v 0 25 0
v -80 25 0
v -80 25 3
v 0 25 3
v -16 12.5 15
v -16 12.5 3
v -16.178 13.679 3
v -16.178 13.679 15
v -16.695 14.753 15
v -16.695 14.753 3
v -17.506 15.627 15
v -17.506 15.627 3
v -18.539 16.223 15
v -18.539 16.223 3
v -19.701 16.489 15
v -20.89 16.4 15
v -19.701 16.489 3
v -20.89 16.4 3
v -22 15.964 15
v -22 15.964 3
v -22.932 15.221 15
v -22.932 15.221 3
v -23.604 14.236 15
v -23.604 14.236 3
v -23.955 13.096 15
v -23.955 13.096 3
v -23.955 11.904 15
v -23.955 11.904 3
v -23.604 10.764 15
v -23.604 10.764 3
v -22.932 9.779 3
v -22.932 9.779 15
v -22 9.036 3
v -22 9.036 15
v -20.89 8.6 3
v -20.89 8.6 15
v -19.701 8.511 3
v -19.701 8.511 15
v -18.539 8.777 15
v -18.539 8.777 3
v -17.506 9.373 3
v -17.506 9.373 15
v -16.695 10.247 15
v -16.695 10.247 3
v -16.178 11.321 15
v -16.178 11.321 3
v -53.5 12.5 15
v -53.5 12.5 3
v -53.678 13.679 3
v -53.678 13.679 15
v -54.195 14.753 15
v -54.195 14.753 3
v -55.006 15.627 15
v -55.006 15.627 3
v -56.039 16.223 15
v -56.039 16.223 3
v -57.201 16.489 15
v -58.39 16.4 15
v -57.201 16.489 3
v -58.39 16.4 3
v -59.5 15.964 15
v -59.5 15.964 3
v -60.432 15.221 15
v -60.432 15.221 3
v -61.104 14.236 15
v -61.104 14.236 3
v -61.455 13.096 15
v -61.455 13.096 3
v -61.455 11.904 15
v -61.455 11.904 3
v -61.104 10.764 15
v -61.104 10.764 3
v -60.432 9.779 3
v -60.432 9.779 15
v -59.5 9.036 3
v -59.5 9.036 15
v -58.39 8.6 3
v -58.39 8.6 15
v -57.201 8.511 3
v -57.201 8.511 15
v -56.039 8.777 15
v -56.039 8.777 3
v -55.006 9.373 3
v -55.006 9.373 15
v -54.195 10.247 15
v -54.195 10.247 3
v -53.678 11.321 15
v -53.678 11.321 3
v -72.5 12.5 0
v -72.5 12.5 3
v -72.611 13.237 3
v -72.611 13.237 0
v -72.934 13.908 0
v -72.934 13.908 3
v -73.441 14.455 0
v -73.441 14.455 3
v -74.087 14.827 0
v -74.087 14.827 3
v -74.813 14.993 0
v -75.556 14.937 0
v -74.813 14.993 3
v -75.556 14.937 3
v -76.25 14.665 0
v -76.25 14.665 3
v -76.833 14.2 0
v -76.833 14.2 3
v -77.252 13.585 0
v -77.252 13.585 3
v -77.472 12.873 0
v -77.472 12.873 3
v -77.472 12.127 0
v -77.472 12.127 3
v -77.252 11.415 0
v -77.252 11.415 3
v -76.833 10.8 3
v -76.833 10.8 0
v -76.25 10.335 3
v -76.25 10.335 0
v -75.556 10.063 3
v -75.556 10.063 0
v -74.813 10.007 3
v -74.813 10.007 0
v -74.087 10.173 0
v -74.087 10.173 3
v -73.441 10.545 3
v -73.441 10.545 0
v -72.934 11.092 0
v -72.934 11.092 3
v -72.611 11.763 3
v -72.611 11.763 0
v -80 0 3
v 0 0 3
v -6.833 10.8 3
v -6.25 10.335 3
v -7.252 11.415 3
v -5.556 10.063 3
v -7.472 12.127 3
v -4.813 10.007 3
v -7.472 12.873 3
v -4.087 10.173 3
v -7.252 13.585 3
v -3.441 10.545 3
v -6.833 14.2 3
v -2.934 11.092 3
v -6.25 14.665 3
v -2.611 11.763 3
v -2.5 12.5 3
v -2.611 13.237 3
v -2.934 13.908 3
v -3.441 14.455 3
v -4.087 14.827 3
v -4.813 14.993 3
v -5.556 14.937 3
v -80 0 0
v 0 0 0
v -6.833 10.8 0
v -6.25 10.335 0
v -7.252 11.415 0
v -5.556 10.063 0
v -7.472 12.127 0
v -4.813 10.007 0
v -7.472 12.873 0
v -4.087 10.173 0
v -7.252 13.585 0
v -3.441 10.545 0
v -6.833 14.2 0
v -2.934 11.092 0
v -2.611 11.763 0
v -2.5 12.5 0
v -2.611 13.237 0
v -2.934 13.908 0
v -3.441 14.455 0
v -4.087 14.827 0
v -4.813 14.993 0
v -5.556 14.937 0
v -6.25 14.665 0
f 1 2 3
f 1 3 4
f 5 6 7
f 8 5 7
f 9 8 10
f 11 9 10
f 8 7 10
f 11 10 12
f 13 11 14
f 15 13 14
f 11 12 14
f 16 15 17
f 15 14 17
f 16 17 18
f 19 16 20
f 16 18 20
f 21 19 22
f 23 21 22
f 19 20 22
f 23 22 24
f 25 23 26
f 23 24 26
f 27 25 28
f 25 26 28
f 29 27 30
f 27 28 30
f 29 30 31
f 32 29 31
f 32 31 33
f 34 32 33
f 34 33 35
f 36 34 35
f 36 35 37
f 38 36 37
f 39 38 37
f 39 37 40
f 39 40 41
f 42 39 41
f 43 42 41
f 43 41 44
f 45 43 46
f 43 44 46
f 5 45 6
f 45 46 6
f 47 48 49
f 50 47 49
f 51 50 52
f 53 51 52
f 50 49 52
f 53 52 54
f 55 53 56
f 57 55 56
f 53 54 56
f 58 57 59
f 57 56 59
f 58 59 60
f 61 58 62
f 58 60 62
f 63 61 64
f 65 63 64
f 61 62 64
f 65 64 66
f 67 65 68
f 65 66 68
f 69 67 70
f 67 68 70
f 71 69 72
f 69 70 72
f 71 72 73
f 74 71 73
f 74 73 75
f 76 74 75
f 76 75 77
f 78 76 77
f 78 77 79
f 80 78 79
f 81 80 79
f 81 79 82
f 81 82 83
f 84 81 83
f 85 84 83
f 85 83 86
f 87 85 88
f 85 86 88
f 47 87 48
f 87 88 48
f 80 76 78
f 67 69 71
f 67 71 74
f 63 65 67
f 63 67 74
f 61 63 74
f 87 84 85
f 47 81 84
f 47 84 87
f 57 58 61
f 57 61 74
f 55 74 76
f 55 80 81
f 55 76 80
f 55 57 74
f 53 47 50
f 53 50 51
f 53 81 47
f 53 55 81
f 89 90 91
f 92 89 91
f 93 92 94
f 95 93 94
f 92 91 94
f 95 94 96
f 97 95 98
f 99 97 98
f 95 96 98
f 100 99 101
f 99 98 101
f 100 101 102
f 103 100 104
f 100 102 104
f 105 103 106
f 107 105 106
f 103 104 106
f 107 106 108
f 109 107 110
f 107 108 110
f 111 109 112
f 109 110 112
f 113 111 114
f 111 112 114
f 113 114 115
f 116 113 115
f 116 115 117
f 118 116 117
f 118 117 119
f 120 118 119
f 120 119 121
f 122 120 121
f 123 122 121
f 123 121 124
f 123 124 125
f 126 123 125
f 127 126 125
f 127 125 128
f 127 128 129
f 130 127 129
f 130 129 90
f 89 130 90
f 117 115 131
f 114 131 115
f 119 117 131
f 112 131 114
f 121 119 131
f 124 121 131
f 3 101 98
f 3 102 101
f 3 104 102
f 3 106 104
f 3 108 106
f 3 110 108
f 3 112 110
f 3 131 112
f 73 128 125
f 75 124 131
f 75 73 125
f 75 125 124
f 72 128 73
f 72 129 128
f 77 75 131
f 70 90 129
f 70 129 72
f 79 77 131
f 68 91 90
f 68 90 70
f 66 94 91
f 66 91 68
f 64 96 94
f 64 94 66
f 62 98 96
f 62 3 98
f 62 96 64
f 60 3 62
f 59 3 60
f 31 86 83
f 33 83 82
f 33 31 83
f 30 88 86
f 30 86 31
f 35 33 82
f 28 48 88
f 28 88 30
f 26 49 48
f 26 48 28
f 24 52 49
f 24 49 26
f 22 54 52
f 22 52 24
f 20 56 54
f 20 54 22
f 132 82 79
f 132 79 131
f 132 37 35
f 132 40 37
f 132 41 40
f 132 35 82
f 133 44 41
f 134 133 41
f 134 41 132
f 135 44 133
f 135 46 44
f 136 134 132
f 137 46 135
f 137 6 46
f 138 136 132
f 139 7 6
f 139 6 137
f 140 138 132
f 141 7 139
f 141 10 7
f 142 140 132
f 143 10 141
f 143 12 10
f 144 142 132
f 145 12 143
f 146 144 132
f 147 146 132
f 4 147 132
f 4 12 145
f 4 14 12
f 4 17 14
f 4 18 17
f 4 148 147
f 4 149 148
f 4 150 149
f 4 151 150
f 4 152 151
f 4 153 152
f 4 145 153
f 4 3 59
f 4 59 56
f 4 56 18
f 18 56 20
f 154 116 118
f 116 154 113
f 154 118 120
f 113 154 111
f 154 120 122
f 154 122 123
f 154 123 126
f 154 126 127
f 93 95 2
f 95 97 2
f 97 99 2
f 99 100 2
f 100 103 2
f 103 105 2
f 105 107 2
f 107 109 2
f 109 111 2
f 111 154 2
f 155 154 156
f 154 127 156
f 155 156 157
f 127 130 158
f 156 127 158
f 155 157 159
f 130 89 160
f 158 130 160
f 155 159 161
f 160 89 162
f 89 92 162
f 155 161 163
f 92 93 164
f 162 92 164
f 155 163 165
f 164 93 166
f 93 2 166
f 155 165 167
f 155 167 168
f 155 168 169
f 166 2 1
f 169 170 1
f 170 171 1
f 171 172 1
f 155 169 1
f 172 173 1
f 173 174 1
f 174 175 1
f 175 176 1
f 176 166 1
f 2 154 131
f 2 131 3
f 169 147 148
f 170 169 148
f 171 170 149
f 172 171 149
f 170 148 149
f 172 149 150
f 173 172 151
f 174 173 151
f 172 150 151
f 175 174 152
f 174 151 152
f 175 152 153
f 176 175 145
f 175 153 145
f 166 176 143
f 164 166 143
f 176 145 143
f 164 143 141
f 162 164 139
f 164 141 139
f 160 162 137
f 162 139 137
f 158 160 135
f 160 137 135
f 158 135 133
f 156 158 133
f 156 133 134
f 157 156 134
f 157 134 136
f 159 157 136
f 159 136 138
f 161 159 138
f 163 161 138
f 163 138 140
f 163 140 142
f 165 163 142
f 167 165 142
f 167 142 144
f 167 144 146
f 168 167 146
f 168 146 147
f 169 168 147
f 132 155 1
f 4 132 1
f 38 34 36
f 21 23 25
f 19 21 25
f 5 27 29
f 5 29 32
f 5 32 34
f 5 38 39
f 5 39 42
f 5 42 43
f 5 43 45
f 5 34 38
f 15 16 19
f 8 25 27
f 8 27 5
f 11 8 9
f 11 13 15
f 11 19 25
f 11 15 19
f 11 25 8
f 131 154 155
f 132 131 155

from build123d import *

# Parameters (mm, degrees)
SKETCH1_W           = 80
SKETCH1_H           = 25
BOSS_EXTRUDE1_DEPTH = 3
SKETCH2_R           = 4
BOSS_EXTRUDE2_DEPTH = 12
SKETCH3_R           = 2.5
CUT_EXTRUDE1_DEPTH  = 8


with BuildPart() as part:
    # Sketch1 → Boss-Extrude1 (new body)
    with BuildSketch(Plane.XY):
        with Locations((-40, 12.5)):
            Rectangle(SKETCH1_W, SKETCH1_H)
    extrude(amount=BOSS_EXTRUDE1_DEPTH)

    # Sketch2 → Boss-Extrude2 (add)
    with BuildSketch(Plane.XY.offset(3)):
        with Locations((-57.5, 12.5)):
            Circle(SKETCH2_R)
        with Locations((-20, 12.5)):
            Circle(SKETCH2_R)
    extrude(amount=BOSS_EXTRUDE2_DEPTH)

    # Sketch3 → Cut-Extrude1 (cut)
    with BuildSketch(Plane.XY.offset(3)):
        with Locations((-75, 12.5)):
            Circle(SKETCH3_R)
        with Locations((-5, 12.5)):
            Circle(SKETCH3_R)
    extrude(amount=-CUT_EXTRUDE1_DEPTH, mode=Mode.SUBTRACT)


solid = part.part
